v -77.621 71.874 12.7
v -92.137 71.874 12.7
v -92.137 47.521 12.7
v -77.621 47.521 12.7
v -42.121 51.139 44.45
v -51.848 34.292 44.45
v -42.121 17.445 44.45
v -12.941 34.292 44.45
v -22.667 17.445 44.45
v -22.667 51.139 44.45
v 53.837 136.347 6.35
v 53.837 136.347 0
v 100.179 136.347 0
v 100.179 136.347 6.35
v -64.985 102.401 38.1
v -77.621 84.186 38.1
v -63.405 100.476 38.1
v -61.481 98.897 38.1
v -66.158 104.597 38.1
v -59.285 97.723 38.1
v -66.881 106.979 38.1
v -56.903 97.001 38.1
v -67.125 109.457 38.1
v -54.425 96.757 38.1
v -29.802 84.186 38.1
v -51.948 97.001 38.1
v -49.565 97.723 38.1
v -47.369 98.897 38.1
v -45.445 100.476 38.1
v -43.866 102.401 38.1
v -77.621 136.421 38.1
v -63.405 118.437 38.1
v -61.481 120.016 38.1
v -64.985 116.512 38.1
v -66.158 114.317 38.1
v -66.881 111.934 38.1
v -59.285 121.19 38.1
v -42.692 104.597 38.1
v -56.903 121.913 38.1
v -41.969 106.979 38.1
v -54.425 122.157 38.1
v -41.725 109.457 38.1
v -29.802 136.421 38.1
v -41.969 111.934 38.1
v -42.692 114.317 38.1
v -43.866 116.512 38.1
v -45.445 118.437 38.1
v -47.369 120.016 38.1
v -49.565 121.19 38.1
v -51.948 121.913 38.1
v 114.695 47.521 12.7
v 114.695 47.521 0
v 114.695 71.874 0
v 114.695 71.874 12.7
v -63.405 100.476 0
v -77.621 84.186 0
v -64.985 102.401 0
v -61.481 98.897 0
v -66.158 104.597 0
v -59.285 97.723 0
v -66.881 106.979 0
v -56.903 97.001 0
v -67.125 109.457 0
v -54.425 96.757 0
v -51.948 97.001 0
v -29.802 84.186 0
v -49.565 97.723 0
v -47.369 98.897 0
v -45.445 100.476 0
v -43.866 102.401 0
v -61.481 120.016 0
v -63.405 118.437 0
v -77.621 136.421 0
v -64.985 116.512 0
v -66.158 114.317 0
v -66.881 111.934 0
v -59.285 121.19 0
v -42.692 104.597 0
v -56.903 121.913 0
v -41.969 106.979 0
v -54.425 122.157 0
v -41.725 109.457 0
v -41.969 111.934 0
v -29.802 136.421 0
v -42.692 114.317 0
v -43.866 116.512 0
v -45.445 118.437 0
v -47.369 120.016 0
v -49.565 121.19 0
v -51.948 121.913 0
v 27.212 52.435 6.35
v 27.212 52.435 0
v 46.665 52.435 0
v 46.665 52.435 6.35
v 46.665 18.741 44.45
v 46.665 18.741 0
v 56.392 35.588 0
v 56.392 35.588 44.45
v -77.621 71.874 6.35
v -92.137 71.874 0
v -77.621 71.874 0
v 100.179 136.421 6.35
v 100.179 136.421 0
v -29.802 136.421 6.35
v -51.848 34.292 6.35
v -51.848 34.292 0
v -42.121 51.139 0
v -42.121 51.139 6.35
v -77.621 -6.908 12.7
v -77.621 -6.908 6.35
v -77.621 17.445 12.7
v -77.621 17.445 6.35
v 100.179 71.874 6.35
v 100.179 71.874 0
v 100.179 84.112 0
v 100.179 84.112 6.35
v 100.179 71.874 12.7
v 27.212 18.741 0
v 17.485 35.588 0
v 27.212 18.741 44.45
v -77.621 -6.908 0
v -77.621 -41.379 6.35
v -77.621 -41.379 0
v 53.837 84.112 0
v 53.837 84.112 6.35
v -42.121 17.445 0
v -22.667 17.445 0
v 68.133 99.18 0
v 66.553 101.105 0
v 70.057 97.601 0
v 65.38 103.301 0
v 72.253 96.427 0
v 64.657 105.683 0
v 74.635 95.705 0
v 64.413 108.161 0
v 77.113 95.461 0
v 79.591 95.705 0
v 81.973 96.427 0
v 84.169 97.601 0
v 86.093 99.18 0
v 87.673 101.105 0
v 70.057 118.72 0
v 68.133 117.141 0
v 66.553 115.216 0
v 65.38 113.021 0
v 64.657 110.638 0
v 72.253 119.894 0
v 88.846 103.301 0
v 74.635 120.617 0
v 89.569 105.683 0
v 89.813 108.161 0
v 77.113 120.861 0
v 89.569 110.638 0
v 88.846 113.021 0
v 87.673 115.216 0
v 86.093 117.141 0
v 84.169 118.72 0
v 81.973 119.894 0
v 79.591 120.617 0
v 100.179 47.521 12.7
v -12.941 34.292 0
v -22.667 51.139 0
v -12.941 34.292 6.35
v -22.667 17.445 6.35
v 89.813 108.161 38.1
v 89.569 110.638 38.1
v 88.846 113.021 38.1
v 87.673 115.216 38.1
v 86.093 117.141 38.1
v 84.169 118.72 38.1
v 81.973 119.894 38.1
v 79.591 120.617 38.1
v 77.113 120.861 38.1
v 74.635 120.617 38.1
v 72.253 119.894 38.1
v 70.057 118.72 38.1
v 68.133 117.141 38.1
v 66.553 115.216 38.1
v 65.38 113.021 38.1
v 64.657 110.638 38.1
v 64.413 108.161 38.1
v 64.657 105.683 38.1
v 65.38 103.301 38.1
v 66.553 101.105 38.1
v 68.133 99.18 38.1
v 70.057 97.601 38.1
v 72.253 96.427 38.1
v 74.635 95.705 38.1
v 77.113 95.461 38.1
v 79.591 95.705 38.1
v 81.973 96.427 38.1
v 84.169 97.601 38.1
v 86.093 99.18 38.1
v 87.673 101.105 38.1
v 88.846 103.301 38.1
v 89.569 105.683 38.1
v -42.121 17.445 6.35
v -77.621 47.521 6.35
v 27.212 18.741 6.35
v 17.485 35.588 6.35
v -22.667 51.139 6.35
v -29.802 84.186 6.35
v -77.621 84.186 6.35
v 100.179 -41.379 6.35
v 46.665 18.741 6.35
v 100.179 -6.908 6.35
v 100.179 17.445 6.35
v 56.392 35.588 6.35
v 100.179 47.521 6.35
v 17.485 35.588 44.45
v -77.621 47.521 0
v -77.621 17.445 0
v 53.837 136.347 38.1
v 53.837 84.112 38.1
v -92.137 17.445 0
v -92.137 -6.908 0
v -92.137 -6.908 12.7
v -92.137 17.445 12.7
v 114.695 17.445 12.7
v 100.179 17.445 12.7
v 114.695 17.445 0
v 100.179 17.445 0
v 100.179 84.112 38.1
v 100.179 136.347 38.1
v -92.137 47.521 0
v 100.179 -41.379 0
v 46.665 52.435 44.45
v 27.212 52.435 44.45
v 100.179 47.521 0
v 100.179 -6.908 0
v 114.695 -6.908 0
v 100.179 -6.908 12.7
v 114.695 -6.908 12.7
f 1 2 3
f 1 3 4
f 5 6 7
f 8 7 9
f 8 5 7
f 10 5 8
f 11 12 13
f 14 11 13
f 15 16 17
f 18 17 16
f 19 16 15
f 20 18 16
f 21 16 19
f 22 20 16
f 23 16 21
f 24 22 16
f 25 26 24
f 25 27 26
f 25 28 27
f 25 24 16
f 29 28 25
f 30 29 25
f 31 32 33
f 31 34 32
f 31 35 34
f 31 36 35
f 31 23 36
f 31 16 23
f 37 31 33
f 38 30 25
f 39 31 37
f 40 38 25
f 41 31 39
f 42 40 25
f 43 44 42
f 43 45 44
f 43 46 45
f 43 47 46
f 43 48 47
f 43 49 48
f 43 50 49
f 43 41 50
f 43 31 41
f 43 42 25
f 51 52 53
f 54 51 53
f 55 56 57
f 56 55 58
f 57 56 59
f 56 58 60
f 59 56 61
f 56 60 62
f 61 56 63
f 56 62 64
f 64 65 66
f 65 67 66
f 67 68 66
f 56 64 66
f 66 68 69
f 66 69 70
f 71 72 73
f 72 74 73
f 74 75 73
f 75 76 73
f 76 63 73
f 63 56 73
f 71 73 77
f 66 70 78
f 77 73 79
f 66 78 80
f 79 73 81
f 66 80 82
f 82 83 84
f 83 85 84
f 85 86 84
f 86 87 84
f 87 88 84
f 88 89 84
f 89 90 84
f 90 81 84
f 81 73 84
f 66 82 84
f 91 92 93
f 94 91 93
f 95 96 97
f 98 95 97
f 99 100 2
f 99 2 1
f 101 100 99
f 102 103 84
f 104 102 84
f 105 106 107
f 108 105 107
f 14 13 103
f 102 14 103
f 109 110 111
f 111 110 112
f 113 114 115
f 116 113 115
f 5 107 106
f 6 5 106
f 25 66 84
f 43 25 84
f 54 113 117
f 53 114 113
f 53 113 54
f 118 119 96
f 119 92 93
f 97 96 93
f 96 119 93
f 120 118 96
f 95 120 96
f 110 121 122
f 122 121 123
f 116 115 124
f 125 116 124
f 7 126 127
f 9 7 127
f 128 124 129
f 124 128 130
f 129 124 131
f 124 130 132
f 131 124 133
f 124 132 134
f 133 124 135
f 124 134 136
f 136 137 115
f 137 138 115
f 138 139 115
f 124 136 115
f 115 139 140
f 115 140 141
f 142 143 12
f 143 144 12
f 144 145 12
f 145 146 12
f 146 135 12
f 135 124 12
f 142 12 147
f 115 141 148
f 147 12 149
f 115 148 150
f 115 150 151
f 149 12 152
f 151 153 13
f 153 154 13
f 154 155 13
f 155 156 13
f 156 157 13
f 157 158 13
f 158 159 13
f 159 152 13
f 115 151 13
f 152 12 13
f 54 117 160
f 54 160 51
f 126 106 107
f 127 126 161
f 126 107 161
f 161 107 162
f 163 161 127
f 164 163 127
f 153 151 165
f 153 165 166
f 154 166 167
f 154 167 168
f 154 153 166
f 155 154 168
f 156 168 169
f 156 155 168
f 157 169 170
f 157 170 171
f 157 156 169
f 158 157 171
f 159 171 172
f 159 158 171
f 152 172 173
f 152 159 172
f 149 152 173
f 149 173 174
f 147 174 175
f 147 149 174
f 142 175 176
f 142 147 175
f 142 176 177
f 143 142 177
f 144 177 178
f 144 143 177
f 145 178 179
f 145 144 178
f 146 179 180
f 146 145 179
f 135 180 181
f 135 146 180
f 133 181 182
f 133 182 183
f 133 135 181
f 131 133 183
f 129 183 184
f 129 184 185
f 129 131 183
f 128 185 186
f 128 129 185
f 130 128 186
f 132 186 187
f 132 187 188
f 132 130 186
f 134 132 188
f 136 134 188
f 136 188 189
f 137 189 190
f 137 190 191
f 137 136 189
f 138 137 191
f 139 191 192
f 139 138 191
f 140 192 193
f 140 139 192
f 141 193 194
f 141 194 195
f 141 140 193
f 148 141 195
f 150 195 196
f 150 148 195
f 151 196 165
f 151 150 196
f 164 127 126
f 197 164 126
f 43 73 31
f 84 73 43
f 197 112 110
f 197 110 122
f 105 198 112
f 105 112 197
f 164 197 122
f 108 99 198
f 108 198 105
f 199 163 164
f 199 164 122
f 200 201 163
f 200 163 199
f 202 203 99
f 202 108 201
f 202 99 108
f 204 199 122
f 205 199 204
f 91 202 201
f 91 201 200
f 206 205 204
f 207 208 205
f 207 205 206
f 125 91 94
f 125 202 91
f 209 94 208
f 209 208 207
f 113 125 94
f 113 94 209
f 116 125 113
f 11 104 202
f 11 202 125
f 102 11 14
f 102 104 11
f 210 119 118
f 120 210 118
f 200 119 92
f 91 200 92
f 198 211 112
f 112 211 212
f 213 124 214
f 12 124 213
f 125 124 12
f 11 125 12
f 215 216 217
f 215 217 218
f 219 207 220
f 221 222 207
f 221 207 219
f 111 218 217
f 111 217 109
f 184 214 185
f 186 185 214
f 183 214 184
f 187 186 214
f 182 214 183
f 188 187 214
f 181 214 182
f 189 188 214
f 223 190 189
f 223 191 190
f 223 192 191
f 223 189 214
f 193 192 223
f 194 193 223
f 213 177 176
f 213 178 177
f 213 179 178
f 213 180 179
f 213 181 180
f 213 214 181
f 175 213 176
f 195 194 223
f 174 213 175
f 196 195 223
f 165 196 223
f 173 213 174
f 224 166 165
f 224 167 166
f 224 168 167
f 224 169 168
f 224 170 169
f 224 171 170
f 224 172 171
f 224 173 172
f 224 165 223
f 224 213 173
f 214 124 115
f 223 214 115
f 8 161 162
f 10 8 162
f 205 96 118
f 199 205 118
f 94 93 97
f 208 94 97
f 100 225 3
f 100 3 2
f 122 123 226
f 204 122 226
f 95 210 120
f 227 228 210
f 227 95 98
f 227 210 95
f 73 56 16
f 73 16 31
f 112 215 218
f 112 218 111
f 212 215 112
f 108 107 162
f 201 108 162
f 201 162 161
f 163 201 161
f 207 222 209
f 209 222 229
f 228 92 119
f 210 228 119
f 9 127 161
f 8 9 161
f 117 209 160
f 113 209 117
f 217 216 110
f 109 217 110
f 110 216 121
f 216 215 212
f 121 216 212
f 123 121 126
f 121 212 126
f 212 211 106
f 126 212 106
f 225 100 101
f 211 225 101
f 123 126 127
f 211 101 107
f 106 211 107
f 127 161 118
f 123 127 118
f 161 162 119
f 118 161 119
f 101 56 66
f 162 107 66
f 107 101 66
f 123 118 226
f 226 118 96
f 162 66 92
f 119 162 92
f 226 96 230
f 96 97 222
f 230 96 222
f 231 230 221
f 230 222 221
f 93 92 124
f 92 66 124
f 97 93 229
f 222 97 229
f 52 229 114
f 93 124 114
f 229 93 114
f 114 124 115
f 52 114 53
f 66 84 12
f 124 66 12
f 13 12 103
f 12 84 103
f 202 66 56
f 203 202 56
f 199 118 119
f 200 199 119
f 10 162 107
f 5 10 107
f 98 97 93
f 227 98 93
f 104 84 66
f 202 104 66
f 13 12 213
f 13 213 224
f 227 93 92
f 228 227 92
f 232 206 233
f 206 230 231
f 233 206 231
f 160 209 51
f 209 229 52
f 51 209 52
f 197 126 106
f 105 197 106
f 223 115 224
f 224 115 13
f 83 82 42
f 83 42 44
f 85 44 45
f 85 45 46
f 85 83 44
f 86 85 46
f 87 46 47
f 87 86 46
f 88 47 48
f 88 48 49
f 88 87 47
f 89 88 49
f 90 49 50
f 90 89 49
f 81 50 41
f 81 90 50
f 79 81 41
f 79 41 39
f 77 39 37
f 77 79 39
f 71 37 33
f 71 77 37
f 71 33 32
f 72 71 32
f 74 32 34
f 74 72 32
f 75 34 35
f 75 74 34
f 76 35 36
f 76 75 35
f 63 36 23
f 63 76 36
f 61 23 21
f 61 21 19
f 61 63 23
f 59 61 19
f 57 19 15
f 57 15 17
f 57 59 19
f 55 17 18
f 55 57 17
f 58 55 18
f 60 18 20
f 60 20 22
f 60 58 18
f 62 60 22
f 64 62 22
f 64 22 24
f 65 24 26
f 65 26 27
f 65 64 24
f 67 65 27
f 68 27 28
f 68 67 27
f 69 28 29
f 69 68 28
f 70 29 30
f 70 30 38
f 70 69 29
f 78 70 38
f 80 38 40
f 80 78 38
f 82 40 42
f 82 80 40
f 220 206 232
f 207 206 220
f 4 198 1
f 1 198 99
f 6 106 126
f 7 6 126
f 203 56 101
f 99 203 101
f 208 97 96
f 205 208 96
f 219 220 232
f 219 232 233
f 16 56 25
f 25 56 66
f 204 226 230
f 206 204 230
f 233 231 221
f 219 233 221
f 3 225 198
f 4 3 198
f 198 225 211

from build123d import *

# Parameters (mm, degrees)
F0_W     = 47.818441
F0_H     = 52.235608
F0_R     = 12.7
F0_W_2   = 46.34274
F1_DEPTH = 38.1
F2_DEPTH = 44.45
F3_DEPTH = 6.35
F0_W_3   = 14.515924
F0_H_2   = 24.352949
F0_W_4   = 14.515923
F4_DEPTH = 12.7


with BuildPart() as f1:
    # F0 (on Top) → F1 (new body)
    with BuildSketch(Plane.XY):
        with Locations((-53.711533, 110.303605)):
            Rectangle(F0_W, F0_H)
        with Locations((-54.425206, 109.456658)):
            Circle(F0_R, mode=Mode.SUBTRACT)
        with Locations((77.007876, 110.229509)):
            Rectangle(F0_W_2, F0_H)
        with Locations((77.112868, 108.160719)):
            Circle(F0_R, mode=Mode.SUBTRACT)
    extrude(amount=F1_DEPTH)


with BuildPart() as f2:
    # F0 (on Top) → F2 (new body)
    with BuildSketch(Plane.XY):
        Polygon((-22.667437, 51.139291), (-42.120956, 51.139291), (-51.847716, 34.29205), (-42.120956, 17.444808), (-22.667437, 17.444808), (-12.940678, 34.29205), align=None)
        Polygon((46.665434, 52.435234), (27.211915, 52.435234), (17.485156, 35.587993), (27.211915, 18.740751), (46.665434, 18.740751), (56.392194, 35.587993), align=None)
    extrude(amount=F2_DEPTH)


with BuildPart() as f3:
    # F0 (on Top) → F3 (new body)
    with BuildSketch(Plane.XY):
        Polygon((100.179246, 136.421409), (-29.802313, 136.421409), (-29.802313, 84.185801), (-77.620754, 84.185801), (-77.620754, 71.874358), (-77.620754, 47.521409), (-77.620754, 17.444808), (-77.620754, -6.908141), (-77.620754, -41.378591), (100.179246, -41.378591), (100.179246, -6.908141), (100.179246, 17.444808), (100.179246, 47.521409), (100.179246, 71.874358), (100.179246, 84.111705), (53.836506, 84.111705), (53.836506, 136.347313), (100.179246, 136.347313), align=None)
        Polygon((-51.847716, 34.29205), (-42.120956, 51.139291), (-22.667437, 51.139291), (-12.940678, 34.29205), (-22.667437, 17.444808), (-42.120956, 17.444808), align=None, mode=Mode.SUBTRACT)
        Polygon((17.485156, 35.587993), (27.211915, 52.435234), (46.665434, 52.435234), (56.392194, 35.587993), (46.665434, 18.740751), (27.211915, 18.740751), align=None, mode=Mode.SUBTRACT)
    extrude(amount=F3_DEPTH)

    # F0 (on Top) → F4 (join)
    with BuildSketch(Plane.XY):
        with Locations((-84.878716, 5.268333)):
            Rectangle(F0_W_3, F0_H_2)
        with Locations((-84.878716, 59.697884)):
            Rectangle(F0_W_3, F0_H_2)
        with Locations((107.437207, 5.268333)):
            Rectangle(F0_W_4, F0_H_2)
        with Locations((107.437207, 59.697884)):
            Rectangle(F0_W_4, F0_H_2)
    extrude(amount=F4_DEPTH)


solid = Compound([f1.part, f2.part, f3.part])
